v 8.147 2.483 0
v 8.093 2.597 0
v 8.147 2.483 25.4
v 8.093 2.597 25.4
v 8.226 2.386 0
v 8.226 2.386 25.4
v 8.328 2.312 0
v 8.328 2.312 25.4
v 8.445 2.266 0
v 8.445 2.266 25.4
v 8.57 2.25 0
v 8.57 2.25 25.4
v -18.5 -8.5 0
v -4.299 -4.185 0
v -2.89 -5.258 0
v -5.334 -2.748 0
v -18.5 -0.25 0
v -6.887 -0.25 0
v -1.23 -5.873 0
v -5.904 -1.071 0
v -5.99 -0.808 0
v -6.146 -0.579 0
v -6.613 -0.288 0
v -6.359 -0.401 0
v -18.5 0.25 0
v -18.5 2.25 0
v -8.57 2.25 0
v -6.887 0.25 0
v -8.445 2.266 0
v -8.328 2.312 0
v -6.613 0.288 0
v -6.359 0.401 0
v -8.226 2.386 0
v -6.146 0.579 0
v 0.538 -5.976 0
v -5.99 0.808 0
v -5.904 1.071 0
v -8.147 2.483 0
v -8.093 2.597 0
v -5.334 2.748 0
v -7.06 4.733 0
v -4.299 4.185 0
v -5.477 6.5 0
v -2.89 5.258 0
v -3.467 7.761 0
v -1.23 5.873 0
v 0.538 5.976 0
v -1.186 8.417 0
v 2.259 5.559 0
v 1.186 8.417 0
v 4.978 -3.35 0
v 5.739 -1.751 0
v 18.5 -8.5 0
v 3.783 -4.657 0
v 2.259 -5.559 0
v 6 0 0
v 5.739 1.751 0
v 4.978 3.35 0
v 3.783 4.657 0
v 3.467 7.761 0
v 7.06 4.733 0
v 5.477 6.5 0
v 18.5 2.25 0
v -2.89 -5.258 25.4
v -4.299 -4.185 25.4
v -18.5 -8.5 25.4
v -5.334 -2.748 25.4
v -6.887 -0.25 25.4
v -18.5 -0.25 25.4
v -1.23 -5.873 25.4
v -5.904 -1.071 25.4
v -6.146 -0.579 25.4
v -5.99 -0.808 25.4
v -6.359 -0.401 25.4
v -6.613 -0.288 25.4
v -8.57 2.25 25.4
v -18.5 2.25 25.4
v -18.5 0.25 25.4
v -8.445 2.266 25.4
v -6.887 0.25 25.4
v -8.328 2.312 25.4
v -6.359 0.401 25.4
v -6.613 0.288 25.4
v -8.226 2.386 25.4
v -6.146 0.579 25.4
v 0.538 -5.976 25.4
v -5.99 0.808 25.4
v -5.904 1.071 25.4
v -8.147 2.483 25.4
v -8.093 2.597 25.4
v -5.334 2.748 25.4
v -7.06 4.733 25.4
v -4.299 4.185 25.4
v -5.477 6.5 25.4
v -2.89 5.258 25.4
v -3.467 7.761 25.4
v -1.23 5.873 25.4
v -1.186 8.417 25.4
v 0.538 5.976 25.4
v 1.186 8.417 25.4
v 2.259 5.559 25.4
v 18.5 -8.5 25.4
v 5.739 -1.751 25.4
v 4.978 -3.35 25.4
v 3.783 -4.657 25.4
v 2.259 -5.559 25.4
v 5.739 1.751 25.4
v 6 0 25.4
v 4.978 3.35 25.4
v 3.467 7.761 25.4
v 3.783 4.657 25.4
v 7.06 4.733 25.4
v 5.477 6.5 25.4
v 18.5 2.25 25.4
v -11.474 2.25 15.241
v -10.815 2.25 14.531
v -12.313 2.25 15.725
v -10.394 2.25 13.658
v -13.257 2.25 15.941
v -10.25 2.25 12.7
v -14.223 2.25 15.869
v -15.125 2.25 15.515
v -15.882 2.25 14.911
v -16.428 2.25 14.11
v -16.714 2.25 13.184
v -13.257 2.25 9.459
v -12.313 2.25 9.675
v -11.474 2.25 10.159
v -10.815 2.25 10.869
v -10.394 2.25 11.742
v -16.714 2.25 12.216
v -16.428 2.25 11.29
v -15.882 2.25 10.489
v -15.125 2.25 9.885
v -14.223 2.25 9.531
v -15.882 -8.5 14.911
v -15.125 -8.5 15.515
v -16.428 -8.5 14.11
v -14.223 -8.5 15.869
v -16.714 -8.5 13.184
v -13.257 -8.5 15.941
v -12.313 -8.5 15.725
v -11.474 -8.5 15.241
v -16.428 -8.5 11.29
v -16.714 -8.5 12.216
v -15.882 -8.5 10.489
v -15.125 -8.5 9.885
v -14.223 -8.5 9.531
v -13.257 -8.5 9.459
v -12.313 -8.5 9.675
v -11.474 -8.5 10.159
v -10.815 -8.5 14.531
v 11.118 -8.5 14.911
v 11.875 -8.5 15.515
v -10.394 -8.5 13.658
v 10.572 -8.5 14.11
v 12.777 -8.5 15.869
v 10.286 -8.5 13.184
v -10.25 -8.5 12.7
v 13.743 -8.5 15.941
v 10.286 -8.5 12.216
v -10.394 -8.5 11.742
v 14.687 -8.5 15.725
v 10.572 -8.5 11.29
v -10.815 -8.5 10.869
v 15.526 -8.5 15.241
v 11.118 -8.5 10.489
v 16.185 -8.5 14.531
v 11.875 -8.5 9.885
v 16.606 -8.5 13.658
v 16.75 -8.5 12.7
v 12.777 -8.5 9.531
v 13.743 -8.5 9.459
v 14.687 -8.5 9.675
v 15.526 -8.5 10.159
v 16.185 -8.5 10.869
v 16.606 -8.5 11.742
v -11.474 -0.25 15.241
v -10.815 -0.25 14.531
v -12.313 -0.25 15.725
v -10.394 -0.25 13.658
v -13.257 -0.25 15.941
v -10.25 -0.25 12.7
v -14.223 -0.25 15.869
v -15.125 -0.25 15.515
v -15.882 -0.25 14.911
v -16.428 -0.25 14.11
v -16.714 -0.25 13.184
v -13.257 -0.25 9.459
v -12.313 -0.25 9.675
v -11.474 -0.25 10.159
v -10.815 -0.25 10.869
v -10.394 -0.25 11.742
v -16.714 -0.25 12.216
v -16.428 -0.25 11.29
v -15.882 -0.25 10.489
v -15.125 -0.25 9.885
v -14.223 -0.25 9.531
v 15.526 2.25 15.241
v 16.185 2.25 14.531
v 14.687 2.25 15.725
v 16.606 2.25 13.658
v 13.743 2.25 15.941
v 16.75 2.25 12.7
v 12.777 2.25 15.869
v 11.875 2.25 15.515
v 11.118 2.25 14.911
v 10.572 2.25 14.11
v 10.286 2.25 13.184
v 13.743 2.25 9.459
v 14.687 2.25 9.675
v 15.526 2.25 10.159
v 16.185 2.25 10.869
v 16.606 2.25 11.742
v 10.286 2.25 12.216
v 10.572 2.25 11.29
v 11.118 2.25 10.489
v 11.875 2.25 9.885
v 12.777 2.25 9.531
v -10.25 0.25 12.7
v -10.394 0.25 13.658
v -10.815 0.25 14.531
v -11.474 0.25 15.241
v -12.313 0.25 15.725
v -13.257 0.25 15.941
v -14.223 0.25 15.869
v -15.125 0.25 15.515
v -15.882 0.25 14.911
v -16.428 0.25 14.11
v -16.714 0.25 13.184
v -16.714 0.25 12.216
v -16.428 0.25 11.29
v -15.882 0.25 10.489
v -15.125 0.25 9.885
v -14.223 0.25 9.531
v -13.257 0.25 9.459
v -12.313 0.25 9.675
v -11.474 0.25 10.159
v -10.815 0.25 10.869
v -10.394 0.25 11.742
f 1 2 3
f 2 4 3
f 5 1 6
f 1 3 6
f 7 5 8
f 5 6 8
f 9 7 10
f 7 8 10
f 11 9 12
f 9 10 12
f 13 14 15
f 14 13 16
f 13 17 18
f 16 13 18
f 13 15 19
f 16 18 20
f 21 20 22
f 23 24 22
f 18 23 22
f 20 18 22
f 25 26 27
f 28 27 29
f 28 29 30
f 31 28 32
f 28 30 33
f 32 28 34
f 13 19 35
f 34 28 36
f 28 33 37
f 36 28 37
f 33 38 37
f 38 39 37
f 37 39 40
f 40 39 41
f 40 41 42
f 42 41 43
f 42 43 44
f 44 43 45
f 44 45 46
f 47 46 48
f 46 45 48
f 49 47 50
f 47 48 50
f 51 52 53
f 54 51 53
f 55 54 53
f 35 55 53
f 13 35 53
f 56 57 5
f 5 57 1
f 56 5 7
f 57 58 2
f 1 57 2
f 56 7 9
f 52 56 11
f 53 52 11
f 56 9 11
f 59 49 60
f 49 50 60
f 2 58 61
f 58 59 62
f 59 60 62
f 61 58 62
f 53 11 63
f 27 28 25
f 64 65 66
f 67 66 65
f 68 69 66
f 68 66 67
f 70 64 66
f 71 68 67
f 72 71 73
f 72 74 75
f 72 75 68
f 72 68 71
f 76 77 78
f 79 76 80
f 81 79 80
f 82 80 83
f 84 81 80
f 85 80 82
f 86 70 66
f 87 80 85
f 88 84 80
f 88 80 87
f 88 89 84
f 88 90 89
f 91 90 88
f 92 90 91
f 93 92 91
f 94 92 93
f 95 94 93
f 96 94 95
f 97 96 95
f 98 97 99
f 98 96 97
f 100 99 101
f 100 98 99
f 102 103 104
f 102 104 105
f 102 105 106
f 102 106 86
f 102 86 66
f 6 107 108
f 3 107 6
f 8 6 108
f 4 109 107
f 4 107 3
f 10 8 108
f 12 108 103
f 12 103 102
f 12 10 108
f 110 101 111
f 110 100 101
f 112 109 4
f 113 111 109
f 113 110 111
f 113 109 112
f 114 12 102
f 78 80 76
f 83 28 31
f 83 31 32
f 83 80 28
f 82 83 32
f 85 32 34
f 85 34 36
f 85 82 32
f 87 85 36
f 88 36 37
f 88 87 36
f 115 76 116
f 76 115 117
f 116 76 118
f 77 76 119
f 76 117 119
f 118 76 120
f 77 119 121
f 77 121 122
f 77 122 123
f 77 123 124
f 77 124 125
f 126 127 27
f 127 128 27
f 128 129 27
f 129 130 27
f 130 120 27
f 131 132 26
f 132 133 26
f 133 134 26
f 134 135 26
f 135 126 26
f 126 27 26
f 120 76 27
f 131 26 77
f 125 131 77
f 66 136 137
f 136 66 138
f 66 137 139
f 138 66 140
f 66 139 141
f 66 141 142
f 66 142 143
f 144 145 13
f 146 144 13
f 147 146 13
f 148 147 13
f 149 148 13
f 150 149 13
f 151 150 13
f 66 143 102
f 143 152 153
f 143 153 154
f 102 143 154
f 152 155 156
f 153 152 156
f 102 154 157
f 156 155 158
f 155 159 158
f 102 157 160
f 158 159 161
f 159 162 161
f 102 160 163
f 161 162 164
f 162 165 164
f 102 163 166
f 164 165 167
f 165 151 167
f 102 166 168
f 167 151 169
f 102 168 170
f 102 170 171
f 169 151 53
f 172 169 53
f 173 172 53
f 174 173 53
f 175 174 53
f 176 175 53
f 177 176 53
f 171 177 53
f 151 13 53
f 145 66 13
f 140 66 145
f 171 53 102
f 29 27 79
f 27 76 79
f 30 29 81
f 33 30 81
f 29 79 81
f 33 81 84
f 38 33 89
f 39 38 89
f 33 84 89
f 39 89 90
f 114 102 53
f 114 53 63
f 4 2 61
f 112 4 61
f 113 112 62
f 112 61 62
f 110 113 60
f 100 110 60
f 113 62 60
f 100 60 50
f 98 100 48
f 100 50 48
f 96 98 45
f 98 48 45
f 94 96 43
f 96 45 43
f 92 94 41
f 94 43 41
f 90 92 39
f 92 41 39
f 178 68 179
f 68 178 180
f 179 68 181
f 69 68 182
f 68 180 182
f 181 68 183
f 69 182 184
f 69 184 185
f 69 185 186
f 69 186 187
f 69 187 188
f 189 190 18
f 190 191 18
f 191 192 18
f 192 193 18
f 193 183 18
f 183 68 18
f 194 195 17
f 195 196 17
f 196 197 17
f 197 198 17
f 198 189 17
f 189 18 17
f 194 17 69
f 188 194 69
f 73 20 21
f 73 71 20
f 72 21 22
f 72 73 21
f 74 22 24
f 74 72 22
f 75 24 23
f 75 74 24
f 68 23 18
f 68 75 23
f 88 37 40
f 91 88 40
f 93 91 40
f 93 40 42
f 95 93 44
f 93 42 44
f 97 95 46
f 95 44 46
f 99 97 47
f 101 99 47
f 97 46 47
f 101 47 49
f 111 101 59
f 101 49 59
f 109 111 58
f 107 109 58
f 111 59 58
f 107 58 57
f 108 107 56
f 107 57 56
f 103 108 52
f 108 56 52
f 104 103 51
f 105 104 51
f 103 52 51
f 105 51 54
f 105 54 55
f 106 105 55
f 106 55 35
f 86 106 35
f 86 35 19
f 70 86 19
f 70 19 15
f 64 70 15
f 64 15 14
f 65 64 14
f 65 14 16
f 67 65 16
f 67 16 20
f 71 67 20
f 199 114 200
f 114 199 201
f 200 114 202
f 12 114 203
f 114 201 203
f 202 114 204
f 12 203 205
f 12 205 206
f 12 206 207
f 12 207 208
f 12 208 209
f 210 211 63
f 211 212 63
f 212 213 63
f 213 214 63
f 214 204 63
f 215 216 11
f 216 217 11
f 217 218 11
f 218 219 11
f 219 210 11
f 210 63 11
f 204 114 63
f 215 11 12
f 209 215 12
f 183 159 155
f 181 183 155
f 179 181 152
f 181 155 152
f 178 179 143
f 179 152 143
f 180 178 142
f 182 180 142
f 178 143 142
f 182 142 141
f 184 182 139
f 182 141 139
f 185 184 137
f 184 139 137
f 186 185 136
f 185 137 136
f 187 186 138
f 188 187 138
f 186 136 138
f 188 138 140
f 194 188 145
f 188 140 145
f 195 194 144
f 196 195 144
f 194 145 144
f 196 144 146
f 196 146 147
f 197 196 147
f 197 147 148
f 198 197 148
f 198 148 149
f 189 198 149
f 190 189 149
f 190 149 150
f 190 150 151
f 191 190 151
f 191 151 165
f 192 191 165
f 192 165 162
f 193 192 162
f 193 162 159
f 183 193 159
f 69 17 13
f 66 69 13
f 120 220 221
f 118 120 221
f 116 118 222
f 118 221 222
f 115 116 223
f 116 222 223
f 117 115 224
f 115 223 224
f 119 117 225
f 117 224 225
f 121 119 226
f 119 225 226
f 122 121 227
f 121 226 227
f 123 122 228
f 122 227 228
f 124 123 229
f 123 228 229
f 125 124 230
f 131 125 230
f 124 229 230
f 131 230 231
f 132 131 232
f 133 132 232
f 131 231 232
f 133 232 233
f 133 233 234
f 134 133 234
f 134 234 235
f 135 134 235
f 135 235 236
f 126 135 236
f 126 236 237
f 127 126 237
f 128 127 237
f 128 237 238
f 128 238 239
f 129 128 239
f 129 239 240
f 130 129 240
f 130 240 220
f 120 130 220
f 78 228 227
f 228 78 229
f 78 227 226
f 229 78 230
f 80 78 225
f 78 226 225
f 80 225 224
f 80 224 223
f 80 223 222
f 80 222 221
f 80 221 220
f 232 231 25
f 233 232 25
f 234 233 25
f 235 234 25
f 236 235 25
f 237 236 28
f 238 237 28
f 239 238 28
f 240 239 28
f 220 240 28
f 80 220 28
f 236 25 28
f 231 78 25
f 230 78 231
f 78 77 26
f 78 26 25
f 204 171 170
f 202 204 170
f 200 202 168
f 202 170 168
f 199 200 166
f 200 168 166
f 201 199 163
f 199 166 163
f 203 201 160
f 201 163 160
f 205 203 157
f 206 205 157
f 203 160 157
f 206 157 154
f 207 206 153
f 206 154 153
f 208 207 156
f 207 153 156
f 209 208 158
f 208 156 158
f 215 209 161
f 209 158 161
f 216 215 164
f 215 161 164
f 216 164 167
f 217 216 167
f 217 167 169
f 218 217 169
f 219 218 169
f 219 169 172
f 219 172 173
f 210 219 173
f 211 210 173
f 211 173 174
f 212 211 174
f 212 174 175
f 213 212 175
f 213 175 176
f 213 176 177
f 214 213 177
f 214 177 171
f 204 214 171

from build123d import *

# Parameters (mm, degrees)
F1_DEPTH = 25.4
F2_R     = 1
F3_R     = 0.5
F4_R     = 3.25
F5_DEPTH = 17.001


with BuildPart() as f1:
    # F0 (on Top) → F1 (new body)
    with BuildSketch(Plane.XY):
        with BuildLine():
            Line((-18.5, -0.25), (-18.5, -8.5))
            Line((-18.5, -8.5), (18.5, -8.5))
            Line((18.5, -8.5), (18.5, 2.25))
            Line((18.5, 2.25), (8.196798, 2.25))
            ThreePointArc((8.196798, 2.25), (0, 8.5), (-8.196798, 2.25))
            Line((-8.196798, 2.25), (-18.5, 2.25))
            Line((-18.5, 2.25), (-18.5, 0.25))
            Line((-18.5, 0.25), (-5.994789, 0.25))
            ThreePointArc((-5.994789, 0.25), (6, 0), (-5.994789, -0.25))
            Line((-5.994789, -0.25), (-18.5, -0.25))
        make_face()
    extrude(amount=F1_DEPTH)

    # F2
    f2_edges = [f1.edges().sort_by_distance(p)[0] for p in [
        (-5.994789, 0.25, 12.7),
        (-5.994789, -0.25, 12.7),
    ]]
    fillet(f2_edges, radius=F2_R)

    # F3
    f3_edges = [f1.edges().sort_by_distance(p)[0] for p in [
        (-8.196798, 2.25, 12.7),
        (8.196798, 2.25, 12.7),
    ]]
    fillet(f3_edges, radius=F3_R)

    # F4 (on face) → F5 (cut, through all)
    with BuildSketch(Plane.XZ.offset(8.5)):
        with Locations((-13.5, 12.7)):
            Circle(F4_R)
        with Locations((13.5, 12.7)):
            Circle(F4_R)
    extrude(amount=-F5_DEPTH, mode=Mode.SUBTRACT)


solid = f1.part
